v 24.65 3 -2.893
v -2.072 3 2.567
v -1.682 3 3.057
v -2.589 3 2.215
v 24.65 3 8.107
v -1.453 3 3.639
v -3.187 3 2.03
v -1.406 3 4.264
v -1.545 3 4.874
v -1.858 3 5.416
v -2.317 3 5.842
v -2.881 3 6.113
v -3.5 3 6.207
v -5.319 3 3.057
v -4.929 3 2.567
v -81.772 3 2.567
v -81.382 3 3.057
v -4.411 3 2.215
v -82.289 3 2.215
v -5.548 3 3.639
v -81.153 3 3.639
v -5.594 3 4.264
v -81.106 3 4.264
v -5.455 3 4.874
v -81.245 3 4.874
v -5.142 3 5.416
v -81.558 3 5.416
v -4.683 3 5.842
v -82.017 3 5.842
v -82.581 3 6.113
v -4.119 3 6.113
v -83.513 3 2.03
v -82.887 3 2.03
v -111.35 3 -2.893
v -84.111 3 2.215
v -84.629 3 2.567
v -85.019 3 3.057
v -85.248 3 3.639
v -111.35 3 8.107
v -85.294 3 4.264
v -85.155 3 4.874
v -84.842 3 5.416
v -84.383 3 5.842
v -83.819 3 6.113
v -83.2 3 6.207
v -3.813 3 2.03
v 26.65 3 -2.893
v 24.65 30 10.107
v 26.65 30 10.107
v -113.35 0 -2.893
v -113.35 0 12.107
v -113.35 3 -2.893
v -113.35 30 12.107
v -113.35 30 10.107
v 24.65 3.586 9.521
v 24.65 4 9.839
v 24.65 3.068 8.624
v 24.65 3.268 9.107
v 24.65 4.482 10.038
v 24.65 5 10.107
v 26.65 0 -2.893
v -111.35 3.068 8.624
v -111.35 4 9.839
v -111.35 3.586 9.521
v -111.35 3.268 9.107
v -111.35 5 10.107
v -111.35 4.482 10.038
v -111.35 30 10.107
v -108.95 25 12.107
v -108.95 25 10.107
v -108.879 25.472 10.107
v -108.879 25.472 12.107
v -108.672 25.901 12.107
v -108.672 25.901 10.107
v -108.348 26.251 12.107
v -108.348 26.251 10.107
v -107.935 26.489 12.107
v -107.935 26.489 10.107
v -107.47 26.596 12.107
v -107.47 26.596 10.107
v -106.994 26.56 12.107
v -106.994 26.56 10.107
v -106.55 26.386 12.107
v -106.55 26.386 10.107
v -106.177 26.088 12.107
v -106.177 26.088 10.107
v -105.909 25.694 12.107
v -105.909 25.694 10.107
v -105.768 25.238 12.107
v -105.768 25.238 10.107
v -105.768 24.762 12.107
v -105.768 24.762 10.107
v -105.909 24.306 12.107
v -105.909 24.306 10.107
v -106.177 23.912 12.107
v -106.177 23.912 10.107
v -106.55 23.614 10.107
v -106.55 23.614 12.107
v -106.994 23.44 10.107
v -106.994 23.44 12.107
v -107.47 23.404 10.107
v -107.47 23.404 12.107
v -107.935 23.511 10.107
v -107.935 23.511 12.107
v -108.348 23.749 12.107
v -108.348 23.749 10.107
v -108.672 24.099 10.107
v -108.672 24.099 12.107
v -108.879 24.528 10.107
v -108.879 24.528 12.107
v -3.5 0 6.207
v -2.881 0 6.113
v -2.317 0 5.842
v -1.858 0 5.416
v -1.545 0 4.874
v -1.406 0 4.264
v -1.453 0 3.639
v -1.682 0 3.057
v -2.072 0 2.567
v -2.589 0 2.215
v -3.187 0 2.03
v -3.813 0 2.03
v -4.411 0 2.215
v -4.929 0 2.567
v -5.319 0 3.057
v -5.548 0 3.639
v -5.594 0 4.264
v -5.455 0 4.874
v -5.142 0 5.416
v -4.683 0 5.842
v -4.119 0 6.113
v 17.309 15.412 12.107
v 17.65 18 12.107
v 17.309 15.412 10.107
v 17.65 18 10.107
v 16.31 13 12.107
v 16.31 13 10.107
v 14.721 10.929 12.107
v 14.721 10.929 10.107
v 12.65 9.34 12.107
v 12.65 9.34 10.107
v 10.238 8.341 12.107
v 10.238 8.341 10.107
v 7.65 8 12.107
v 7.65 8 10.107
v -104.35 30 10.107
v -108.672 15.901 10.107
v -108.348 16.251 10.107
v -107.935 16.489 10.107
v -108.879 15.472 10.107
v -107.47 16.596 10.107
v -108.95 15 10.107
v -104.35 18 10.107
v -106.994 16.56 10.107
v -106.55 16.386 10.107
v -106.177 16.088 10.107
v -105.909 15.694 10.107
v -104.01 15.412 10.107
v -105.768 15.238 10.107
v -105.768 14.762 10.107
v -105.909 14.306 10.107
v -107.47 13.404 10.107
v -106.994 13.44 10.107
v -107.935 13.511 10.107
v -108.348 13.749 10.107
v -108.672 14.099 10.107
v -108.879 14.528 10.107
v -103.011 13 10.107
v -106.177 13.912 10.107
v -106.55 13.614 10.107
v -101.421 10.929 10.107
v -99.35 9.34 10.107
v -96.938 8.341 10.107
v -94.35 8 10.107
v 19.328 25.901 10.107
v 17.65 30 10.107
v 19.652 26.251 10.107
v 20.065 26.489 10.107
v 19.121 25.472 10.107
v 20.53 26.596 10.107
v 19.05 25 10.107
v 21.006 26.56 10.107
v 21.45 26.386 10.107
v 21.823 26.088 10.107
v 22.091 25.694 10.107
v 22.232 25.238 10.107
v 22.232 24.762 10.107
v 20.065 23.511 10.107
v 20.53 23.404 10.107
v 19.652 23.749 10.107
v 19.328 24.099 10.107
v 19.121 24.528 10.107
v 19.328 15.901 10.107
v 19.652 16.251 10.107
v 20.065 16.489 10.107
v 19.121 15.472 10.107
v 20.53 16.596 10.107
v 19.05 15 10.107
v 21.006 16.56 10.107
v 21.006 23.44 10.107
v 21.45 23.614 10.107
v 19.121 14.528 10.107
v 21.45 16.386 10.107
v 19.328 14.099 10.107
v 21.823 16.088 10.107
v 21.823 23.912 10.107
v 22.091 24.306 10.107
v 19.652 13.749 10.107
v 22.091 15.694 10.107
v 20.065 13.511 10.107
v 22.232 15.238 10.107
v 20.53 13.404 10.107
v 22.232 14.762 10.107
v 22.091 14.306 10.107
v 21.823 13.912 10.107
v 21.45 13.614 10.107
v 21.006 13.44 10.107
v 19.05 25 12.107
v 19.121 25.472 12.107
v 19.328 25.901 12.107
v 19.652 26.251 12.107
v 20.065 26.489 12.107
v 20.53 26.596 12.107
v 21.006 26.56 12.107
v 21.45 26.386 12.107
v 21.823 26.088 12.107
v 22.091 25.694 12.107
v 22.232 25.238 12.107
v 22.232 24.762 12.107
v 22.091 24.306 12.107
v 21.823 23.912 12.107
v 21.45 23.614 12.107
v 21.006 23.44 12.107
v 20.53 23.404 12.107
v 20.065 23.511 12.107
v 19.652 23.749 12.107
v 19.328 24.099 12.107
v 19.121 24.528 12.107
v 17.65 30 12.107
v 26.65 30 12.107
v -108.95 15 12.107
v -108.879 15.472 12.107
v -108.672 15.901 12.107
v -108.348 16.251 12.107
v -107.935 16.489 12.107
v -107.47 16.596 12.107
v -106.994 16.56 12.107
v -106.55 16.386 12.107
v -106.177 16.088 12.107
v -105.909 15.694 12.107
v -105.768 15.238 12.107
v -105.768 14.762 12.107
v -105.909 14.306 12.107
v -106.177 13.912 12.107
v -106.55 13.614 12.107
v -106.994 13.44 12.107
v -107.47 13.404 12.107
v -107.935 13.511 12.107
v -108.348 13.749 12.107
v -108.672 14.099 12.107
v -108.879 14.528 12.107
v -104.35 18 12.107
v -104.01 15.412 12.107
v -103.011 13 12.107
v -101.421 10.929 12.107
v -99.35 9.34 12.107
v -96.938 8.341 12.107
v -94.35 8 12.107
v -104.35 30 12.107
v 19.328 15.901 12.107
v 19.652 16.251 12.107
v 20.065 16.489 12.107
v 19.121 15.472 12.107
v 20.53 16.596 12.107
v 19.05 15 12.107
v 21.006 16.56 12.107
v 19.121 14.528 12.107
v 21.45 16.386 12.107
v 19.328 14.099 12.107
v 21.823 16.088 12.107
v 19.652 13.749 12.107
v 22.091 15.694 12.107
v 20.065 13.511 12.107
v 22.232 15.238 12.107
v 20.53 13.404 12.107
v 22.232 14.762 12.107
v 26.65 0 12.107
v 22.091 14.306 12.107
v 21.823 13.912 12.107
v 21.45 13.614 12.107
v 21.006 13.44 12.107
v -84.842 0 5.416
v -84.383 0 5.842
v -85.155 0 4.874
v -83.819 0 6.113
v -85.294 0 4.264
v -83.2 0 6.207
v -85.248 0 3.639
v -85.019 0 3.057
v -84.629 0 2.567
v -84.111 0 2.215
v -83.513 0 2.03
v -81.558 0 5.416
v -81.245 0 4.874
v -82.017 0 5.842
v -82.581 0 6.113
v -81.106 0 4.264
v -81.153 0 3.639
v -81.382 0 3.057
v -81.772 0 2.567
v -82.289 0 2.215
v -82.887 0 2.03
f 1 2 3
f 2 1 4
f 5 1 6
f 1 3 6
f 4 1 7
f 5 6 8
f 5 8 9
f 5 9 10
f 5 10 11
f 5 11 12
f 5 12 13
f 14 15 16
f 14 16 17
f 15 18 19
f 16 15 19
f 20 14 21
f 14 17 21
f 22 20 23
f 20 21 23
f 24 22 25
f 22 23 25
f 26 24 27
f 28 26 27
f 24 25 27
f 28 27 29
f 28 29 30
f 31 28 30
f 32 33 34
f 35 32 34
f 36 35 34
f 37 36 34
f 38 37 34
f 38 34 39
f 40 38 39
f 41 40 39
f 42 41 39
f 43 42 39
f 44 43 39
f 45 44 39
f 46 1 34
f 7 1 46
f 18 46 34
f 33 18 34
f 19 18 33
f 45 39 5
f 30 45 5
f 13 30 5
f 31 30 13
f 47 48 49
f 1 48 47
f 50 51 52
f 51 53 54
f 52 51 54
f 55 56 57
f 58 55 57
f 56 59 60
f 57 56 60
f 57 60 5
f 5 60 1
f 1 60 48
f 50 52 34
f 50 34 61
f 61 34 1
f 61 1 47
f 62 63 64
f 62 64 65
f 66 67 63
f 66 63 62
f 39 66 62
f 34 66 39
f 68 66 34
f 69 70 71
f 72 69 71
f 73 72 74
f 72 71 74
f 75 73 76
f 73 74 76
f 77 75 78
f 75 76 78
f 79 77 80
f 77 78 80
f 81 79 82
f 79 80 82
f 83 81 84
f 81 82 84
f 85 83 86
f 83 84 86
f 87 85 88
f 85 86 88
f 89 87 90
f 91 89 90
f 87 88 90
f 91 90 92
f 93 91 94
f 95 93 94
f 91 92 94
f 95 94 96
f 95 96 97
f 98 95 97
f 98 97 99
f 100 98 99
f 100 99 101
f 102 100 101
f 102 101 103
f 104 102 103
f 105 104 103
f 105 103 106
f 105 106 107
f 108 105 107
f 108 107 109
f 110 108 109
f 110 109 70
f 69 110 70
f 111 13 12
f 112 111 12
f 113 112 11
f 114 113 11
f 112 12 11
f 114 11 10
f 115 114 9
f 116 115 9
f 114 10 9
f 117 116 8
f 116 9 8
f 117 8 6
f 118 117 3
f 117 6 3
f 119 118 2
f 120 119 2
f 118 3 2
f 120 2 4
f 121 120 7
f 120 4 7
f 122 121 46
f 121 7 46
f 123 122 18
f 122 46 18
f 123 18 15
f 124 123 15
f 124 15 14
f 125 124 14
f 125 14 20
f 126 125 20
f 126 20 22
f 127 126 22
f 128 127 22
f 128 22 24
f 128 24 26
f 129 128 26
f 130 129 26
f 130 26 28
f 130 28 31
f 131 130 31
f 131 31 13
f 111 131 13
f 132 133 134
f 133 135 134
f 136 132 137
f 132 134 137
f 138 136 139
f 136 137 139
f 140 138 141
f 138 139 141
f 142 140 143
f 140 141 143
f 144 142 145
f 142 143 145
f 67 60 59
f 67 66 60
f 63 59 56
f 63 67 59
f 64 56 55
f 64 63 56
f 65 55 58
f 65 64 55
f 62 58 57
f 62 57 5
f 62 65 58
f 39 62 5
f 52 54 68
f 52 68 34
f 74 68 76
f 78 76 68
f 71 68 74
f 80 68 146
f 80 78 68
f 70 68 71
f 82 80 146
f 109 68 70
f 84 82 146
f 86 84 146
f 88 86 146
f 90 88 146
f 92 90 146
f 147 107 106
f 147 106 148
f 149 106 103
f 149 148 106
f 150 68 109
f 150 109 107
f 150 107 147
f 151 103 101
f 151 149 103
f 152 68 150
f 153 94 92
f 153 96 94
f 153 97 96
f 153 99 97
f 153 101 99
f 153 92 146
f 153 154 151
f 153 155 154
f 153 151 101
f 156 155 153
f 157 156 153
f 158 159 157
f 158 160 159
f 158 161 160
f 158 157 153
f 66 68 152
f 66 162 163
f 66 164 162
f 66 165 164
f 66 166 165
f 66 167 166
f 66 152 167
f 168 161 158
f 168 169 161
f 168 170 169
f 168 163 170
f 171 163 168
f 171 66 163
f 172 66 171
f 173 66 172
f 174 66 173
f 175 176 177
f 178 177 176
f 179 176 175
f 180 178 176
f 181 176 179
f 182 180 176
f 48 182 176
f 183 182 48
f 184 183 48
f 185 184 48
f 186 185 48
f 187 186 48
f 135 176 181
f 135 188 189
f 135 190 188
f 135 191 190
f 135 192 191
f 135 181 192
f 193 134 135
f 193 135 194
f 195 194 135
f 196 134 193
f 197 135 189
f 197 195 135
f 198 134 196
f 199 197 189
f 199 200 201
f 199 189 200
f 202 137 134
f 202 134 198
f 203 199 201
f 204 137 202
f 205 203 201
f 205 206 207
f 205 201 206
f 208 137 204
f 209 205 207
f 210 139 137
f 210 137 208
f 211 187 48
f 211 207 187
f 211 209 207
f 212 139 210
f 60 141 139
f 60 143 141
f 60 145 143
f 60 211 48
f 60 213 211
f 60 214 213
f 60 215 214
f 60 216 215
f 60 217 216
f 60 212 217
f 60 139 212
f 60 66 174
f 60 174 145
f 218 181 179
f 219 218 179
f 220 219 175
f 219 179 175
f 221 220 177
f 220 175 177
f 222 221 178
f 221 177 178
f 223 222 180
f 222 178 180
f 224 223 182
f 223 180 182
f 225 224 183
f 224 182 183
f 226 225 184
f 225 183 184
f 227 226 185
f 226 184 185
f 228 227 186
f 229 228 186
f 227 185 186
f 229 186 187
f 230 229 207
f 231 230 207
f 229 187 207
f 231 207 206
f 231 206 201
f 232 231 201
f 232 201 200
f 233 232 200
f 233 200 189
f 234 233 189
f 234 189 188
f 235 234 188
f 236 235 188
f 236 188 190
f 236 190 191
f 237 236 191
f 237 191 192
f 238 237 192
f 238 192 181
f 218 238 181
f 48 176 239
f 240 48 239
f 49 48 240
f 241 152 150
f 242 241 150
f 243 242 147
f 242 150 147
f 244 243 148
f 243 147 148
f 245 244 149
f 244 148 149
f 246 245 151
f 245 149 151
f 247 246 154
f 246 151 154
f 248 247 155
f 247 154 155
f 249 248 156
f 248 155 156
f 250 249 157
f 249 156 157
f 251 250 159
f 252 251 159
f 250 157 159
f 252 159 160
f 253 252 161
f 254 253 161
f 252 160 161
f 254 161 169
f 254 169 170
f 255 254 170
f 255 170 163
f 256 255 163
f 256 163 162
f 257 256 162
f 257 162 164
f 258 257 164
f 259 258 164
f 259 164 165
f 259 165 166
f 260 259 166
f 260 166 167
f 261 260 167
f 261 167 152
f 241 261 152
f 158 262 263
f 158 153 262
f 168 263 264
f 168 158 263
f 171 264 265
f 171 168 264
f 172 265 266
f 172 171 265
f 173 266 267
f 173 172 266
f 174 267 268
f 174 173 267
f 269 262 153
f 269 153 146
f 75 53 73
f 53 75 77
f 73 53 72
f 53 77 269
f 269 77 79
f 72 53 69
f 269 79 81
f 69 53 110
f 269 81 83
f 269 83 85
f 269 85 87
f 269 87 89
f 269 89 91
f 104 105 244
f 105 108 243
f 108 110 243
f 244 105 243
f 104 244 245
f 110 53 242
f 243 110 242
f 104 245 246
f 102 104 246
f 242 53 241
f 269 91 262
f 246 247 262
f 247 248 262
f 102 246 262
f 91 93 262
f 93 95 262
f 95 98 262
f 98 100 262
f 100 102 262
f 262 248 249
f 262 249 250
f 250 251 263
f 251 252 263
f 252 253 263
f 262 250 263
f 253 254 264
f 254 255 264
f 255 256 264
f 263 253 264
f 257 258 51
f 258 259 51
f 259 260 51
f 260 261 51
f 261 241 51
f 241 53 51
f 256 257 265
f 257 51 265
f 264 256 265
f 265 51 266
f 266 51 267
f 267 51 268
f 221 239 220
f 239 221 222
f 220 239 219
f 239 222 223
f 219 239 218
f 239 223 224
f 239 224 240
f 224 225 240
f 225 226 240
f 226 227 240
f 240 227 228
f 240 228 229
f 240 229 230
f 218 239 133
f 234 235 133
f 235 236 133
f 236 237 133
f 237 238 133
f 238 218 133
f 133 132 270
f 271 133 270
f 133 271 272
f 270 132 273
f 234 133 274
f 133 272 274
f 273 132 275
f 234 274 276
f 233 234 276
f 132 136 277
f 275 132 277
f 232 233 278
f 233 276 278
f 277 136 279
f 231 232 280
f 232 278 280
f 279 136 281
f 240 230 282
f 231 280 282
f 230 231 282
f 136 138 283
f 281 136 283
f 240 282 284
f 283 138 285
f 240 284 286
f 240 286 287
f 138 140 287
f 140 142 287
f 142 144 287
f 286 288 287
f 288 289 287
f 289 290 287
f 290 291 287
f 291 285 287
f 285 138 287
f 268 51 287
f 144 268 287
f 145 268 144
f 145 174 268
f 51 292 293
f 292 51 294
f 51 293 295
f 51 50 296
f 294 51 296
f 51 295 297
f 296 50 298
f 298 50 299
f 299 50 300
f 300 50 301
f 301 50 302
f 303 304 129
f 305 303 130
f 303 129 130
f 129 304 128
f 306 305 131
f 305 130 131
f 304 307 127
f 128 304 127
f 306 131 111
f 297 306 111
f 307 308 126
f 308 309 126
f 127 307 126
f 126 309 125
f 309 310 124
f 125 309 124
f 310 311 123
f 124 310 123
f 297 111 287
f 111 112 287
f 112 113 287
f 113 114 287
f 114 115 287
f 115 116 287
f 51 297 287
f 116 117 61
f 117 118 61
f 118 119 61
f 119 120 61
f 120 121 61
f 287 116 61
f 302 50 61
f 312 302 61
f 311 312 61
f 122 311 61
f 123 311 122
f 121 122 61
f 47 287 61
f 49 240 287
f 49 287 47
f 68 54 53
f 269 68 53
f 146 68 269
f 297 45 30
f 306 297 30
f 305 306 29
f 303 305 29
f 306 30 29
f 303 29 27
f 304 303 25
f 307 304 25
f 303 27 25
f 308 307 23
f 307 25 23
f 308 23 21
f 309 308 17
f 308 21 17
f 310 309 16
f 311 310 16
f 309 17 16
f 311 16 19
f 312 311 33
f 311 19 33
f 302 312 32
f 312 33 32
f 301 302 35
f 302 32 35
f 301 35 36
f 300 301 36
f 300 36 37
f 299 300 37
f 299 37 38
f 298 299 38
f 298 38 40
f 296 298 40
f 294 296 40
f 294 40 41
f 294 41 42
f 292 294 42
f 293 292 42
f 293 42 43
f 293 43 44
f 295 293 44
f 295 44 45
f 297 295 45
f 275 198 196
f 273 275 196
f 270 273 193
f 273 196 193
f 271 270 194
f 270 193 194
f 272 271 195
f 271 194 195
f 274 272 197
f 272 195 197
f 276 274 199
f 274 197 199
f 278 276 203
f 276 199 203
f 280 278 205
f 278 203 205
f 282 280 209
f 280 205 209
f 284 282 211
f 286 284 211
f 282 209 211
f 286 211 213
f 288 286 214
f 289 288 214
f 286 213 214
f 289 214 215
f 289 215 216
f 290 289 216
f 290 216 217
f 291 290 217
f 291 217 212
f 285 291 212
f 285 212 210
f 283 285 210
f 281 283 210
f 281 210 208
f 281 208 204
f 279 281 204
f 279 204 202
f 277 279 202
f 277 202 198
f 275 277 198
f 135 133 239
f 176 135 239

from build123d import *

# Parameters (mm, degrees)
SKETCH1_W           = 140
SKETCH1_H           = 15
BOSS_EXTRUDE1_DEPTH = 30
SKETCH2_W           = 122
SKETCH2_H           = 27
CUT_EXTRUDE1_DEPTH  = 30
SKETCH3_W           = 13
SKETCH3_H           = 27
CUT_EXTRUDE2_DEPTH  = 144.689142732
BOSS_EXTRUDE2_REACH = 119.876
SKETCH4_W           = 2
SKETCH4_H           = 13
CUT_EXTRUDE3_DEPTH  = 144.689142732
SKETCH6_R           = 1.6
CUT_EXTRUDE4_DEPTH  = 118.971522149
SKETCH7_R           = 2.1
CUT_EXTRUDE5_DEPTH  = 30
SKETCH8_W           = 122
SKETCH8_H           = 2
BOSS_EXTRUDE3_DEPTH = 5
FILLET3_R           = 10
FILLET4_R           = 2


with BuildPart() as part:
    # Sketch1 → Boss-Extrude1 (new body)
    with BuildSketch(Plane(origin=(0, 0, 0), x_dir=(1, 0, 0), z_dir=(0, 1, 0))):
        with Locations((-43.350253807, -4.606598985)):
            Rectangle(SKETCH1_W, SKETCH1_H)
    extrude(amount=BOSS_EXTRUDE1_DEPTH)

    # Sketch2 → Cut-Extrude1 (cut)
    with BuildSketch(Plane.XY.offset(12.106598985)):
        with Locations((-43.350253807, 16.5)):
            Rectangle(SKETCH2_W, SKETCH2_H)
    extrude(amount=-CUT_EXTRUDE1_DEPTH, mode=Mode.SUBTRACT)

    # Sketch3 → Cut-Extrude2 (cut, through all)
    with BuildSketch(Plane.ZY.offset(113.350253807)):
        with Locations((3.606598985, 16.5)):
            Rectangle(SKETCH3_W, SKETCH3_H)
    extrude(amount=-CUT_EXTRUDE2_DEPTH, mode=Mode.SUBTRACT)

    # Sketch4 → Boss-Extrude2 (add, up to next)
    with BuildSketch(Plane(origin=(0, 30, 0), x_dir=(1, 0, 0), z_dir=(0, 1, 0)), mode=Mode.PRIVATE) as boss_extrude2_sk1:
        with Locations((25.649746193, -3.606598985)):
            Rectangle(SKETCH4_W, SKETCH4_H)
    boss_extrude2_tool1 = extrude(boss_extrude2_sk1.sketch, amount=-BOSS_EXTRUDE2_REACH, mode=Mode.PRIVATE) - part.part
    # Sketch4 → Boss-Extrude2 (add, up to next)
    with BuildSketch(Plane(origin=(0, 30, 0), x_dir=(1, 0, 0), z_dir=(0, 1, 0)), mode=Mode.PRIVATE) as boss_extrude2_sk2:
        with Locations((-112.350253807, -3.606598985)):
            Rectangle(SKETCH4_W, SKETCH4_H)
    boss_extrude2_tool2 = extrude(boss_extrude2_sk2.sketch, amount=-BOSS_EXTRUDE2_REACH, mode=Mode.PRIVATE) - part.part
    add(boss_extrude2_tool1.solids().sort_by_distance((25.649746, 30, 3.606599))[0])
    add(boss_extrude2_tool2.solids().sort_by_distance((-112.350254, 30, 3.606599))[0])

    # Sketch5 → Cut-Extrude3 (cut, through all)
    with BuildSketch(Plane.ZY.offset(113.350253807)):
        Polygon((10.106598985, 30), (-2.893401015, 3), (-2.893401015, 30), align=None)
    extrude(amount=-CUT_EXTRUDE3_DEPTH, mode=Mode.SUBTRACT)

    # Sketch6 → Cut-Extrude4 (cut, through all)
    with BuildSketch(Plane(origin=(0, 0, 10.106598985), x_dir=(-1, 0, 0), z_dir=(0, 0, -1))):
        with Locations((-20.649746193, 25)):
            Circle(SKETCH6_R)
        with Locations((-20.649746193, 15)):
            Circle(SKETCH6_R)
        with Locations((107.350253807, 25)):
            Circle(SKETCH6_R)
        with Locations((107.350253807, 15)):
            Circle(SKETCH6_R)
    extrude(amount=-CUT_EXTRUDE4_DEPTH, mode=Mode.SUBTRACT)

    # Sketch7 → Cut-Extrude5 (cut)
    with BuildSketch(Plane(origin=(0, 3, 0), x_dir=(1, 0, 0), z_dir=(0, 1, 0))):
        with Locations(Location((-3.500253807, -4.106598985, 0), (0, 0, 270))):
            Circle(SKETCH7_R)
        with Locations(Location((-83.200253807, -4.106598985, 0), (0, 0, 270))):
            Circle(SKETCH7_R)
    extrude(amount=-CUT_EXTRUDE5_DEPTH, mode=Mode.SUBTRACT)

    # Sketch8 → Boss-Extrude3 (add)
    with BuildSketch(Plane(origin=(0, 3, 0), x_dir=(1, 0, 0), z_dir=(0, 1, 0))):
        with Locations((-43.350253807, -11.106598985)):
            Rectangle(SKETCH8_W, SKETCH8_H)
    extrude(amount=BOSS_EXTRUDE3_DEPTH)

    # Fillet3
    fillet3_edges = [part.edges().sort_by_distance(p)[0] for p in [
        (17.649746193, 8, 11.106598985),
        (-104.350253807, 8, 11.106598985),
    ]]
    fillet(fillet3_edges, radius=FILLET3_R)

    # Fillet4
    fillet4_edges = [part.edges().sort_by_distance(p)[0] for p in [
        (-43.350253807, 3, 10.106598985),
    ]]
    fillet(fillet4_edges, radius=FILLET4_R)


solid = part.part
